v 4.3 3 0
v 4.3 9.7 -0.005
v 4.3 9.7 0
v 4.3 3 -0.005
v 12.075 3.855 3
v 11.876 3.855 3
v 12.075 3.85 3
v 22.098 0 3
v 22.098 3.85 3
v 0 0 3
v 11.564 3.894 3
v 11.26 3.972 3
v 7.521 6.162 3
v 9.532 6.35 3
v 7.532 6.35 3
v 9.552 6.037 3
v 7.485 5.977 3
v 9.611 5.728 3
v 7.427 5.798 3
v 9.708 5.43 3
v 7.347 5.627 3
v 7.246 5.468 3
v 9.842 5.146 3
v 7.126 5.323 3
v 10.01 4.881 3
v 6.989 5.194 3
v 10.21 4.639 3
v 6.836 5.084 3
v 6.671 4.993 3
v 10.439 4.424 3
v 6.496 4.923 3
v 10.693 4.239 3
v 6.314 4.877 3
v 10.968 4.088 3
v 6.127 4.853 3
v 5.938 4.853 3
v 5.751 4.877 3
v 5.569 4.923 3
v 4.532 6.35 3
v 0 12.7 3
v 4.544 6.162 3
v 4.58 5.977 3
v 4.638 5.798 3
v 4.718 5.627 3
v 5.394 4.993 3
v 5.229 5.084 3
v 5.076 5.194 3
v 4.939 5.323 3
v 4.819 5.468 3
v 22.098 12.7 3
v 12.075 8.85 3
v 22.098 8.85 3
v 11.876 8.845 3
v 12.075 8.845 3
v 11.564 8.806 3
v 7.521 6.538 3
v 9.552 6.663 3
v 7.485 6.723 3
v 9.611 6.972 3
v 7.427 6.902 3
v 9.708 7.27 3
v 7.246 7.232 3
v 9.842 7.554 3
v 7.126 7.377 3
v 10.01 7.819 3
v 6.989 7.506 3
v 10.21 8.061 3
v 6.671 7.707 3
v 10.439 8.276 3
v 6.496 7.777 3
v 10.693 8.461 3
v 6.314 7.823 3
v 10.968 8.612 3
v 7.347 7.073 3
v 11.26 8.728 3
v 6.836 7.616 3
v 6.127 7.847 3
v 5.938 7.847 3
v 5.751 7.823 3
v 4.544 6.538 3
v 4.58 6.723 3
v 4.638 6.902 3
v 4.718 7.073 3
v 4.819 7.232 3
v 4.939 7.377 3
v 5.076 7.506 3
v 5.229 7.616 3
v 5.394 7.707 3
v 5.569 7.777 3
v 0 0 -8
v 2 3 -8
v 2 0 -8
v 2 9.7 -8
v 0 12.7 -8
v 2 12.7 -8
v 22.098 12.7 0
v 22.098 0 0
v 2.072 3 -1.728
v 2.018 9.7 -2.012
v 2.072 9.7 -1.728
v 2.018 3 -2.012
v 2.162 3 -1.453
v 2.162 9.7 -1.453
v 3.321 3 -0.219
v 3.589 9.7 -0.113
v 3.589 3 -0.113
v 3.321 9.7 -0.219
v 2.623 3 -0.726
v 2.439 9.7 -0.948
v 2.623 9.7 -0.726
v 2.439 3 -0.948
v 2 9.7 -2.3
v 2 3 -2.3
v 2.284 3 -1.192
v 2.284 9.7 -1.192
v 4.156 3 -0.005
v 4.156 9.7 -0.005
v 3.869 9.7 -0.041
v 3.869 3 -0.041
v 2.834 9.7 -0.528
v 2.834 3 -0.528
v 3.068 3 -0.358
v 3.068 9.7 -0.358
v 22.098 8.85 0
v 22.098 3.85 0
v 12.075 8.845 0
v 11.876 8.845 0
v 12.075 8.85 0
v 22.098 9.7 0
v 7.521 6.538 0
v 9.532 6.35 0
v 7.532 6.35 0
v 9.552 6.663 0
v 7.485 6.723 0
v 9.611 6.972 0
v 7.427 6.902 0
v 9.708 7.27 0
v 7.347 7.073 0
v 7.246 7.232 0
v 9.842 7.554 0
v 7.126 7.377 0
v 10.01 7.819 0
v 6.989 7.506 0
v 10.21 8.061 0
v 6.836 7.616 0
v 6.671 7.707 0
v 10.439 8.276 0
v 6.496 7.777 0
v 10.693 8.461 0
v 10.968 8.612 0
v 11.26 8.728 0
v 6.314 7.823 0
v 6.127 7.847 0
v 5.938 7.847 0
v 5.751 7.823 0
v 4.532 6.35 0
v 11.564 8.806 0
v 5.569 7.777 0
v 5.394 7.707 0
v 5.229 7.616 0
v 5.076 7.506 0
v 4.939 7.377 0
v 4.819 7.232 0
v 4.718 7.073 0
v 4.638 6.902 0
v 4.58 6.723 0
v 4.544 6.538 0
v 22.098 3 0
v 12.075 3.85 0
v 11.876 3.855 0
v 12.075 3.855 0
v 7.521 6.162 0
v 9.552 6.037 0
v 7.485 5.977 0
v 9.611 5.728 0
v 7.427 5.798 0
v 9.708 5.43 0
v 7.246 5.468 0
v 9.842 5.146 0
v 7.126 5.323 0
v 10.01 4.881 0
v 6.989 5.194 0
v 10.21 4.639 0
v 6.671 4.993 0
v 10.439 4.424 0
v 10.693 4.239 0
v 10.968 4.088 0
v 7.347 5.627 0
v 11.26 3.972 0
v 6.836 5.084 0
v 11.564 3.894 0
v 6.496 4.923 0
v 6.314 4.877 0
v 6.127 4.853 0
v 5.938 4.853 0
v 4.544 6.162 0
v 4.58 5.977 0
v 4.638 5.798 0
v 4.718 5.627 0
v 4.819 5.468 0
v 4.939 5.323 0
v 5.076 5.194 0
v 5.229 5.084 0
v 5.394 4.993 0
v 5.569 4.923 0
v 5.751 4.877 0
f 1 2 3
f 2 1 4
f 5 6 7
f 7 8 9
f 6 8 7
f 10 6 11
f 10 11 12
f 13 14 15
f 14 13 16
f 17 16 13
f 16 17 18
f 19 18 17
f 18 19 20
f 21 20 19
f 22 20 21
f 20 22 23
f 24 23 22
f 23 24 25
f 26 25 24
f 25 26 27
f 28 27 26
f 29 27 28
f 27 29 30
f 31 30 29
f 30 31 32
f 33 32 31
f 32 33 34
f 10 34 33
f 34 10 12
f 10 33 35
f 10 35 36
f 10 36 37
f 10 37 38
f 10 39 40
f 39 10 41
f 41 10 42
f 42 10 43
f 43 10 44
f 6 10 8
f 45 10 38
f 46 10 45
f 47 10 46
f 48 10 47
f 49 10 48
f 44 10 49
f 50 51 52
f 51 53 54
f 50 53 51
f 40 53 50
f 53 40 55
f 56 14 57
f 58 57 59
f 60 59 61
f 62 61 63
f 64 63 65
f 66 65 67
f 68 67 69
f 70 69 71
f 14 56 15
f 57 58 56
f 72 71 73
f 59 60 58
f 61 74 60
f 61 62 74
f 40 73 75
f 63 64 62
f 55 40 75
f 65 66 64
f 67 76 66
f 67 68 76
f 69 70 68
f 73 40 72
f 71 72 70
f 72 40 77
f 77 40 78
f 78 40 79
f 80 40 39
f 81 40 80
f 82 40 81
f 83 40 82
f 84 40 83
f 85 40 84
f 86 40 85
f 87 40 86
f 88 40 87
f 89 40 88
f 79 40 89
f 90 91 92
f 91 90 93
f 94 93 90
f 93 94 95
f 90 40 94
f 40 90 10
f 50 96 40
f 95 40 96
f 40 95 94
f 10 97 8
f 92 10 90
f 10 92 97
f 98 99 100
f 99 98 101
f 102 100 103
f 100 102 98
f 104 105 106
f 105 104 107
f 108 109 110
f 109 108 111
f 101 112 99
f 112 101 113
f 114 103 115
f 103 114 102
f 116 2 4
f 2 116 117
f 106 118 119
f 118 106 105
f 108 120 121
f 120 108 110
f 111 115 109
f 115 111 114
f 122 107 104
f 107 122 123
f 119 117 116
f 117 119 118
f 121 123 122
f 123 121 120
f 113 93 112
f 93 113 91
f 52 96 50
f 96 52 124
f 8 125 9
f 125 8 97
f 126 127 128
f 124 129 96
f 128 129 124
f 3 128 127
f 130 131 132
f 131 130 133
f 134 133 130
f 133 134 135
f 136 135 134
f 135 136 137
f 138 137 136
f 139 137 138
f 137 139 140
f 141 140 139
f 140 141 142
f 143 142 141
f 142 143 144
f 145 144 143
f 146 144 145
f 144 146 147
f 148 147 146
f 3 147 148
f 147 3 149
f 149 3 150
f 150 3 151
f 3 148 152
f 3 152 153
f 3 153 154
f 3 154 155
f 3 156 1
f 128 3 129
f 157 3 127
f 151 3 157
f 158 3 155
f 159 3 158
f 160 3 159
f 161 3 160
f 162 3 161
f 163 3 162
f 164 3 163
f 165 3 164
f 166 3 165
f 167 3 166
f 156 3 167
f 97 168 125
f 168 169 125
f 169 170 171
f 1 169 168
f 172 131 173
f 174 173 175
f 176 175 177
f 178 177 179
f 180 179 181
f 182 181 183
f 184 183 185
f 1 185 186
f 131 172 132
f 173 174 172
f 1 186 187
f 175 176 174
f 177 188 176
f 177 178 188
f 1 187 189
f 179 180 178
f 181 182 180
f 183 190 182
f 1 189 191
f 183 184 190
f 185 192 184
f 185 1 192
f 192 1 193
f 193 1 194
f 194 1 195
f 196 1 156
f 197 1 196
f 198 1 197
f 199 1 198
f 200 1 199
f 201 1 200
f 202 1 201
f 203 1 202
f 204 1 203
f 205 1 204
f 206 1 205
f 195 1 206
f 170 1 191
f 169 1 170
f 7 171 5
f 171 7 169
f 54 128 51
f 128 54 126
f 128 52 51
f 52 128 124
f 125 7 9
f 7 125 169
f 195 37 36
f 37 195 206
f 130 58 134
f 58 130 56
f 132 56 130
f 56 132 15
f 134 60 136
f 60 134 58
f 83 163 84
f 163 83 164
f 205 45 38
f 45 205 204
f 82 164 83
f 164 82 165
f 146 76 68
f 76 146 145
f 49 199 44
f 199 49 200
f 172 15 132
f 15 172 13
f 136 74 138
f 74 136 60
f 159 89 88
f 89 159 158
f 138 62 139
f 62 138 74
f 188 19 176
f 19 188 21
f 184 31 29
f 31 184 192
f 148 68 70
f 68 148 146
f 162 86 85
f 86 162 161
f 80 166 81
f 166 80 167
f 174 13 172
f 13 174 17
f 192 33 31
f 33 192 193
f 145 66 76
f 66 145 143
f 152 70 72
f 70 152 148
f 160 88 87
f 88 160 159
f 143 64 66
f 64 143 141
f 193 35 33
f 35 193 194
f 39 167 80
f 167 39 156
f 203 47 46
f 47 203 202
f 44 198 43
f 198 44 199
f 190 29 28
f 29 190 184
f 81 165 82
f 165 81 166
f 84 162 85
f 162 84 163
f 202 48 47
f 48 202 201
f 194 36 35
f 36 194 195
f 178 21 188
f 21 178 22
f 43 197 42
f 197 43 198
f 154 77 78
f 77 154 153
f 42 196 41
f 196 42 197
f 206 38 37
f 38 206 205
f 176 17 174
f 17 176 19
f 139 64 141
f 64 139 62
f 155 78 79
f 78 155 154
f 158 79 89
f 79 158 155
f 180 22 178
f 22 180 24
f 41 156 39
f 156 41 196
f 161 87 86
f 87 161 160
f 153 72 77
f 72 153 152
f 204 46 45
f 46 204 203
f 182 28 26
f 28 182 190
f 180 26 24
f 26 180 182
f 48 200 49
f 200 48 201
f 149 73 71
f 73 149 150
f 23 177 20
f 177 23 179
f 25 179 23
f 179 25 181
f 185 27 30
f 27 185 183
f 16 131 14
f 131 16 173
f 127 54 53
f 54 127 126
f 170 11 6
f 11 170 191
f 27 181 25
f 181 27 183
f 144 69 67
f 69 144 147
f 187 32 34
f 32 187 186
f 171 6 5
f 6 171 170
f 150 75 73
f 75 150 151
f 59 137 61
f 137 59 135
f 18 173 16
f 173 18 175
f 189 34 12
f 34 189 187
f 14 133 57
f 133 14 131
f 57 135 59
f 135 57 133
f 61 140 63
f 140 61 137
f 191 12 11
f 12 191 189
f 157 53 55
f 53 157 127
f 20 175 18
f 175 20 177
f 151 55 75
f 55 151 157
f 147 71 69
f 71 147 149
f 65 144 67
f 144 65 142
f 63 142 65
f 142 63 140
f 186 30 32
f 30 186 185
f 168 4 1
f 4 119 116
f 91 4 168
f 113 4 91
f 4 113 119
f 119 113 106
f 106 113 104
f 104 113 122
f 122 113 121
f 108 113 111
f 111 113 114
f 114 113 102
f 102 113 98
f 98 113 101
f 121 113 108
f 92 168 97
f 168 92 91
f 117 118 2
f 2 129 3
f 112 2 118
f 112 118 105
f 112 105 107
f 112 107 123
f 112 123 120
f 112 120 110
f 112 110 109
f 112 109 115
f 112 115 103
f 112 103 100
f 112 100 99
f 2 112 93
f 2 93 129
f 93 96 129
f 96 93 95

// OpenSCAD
width = 0.5 * 25.4;
depth = (0.93 - 0.06) * 25.4;
height = 3;

latch_depth = 0.395 * 25.4;
latch_width = 5;

descender = 8;

difference() {
    translate([0,0, -descender])
    cube([4.3, width, descender+height]);
    
    translate([2+2.3, -0.01, -2.3])
    rotate([-90,0,0])
    cylinder(r=2.3,h=width+0.1, $fn=50);
    
    translate([2, -0.01, -2.3-8])
    cube([3, width+0.1, 8]);
}

difference() {
  cube([depth, width, height]);
  
  translate([depth-latch_depth+0.01, (width-latch_width)/2, -0.01])
    cube([latch_depth + 0.1, latch_width, height + 0.2]);
    
  translate([(depth-latch_depth)/2, width/2, -5])
    cylinder(d=3,h=10,$fn=50);
    
  translate([(depth-latch_depth)/2+6, width/2, -5])
  cylinder(d=latch_width,h=10,$fn=50);
}

module gusset() {
    translate([0,3,0])
    rotate([0, 90, -90])
    linear_extrude(3)
    polygon(points=[
       [-height,0],
       [descender,0],
       [descender,2],
       [0, depth],
       [-height, depth]
    ]);
}

gusset();
translate([0,width - 3,0]) gusset();
